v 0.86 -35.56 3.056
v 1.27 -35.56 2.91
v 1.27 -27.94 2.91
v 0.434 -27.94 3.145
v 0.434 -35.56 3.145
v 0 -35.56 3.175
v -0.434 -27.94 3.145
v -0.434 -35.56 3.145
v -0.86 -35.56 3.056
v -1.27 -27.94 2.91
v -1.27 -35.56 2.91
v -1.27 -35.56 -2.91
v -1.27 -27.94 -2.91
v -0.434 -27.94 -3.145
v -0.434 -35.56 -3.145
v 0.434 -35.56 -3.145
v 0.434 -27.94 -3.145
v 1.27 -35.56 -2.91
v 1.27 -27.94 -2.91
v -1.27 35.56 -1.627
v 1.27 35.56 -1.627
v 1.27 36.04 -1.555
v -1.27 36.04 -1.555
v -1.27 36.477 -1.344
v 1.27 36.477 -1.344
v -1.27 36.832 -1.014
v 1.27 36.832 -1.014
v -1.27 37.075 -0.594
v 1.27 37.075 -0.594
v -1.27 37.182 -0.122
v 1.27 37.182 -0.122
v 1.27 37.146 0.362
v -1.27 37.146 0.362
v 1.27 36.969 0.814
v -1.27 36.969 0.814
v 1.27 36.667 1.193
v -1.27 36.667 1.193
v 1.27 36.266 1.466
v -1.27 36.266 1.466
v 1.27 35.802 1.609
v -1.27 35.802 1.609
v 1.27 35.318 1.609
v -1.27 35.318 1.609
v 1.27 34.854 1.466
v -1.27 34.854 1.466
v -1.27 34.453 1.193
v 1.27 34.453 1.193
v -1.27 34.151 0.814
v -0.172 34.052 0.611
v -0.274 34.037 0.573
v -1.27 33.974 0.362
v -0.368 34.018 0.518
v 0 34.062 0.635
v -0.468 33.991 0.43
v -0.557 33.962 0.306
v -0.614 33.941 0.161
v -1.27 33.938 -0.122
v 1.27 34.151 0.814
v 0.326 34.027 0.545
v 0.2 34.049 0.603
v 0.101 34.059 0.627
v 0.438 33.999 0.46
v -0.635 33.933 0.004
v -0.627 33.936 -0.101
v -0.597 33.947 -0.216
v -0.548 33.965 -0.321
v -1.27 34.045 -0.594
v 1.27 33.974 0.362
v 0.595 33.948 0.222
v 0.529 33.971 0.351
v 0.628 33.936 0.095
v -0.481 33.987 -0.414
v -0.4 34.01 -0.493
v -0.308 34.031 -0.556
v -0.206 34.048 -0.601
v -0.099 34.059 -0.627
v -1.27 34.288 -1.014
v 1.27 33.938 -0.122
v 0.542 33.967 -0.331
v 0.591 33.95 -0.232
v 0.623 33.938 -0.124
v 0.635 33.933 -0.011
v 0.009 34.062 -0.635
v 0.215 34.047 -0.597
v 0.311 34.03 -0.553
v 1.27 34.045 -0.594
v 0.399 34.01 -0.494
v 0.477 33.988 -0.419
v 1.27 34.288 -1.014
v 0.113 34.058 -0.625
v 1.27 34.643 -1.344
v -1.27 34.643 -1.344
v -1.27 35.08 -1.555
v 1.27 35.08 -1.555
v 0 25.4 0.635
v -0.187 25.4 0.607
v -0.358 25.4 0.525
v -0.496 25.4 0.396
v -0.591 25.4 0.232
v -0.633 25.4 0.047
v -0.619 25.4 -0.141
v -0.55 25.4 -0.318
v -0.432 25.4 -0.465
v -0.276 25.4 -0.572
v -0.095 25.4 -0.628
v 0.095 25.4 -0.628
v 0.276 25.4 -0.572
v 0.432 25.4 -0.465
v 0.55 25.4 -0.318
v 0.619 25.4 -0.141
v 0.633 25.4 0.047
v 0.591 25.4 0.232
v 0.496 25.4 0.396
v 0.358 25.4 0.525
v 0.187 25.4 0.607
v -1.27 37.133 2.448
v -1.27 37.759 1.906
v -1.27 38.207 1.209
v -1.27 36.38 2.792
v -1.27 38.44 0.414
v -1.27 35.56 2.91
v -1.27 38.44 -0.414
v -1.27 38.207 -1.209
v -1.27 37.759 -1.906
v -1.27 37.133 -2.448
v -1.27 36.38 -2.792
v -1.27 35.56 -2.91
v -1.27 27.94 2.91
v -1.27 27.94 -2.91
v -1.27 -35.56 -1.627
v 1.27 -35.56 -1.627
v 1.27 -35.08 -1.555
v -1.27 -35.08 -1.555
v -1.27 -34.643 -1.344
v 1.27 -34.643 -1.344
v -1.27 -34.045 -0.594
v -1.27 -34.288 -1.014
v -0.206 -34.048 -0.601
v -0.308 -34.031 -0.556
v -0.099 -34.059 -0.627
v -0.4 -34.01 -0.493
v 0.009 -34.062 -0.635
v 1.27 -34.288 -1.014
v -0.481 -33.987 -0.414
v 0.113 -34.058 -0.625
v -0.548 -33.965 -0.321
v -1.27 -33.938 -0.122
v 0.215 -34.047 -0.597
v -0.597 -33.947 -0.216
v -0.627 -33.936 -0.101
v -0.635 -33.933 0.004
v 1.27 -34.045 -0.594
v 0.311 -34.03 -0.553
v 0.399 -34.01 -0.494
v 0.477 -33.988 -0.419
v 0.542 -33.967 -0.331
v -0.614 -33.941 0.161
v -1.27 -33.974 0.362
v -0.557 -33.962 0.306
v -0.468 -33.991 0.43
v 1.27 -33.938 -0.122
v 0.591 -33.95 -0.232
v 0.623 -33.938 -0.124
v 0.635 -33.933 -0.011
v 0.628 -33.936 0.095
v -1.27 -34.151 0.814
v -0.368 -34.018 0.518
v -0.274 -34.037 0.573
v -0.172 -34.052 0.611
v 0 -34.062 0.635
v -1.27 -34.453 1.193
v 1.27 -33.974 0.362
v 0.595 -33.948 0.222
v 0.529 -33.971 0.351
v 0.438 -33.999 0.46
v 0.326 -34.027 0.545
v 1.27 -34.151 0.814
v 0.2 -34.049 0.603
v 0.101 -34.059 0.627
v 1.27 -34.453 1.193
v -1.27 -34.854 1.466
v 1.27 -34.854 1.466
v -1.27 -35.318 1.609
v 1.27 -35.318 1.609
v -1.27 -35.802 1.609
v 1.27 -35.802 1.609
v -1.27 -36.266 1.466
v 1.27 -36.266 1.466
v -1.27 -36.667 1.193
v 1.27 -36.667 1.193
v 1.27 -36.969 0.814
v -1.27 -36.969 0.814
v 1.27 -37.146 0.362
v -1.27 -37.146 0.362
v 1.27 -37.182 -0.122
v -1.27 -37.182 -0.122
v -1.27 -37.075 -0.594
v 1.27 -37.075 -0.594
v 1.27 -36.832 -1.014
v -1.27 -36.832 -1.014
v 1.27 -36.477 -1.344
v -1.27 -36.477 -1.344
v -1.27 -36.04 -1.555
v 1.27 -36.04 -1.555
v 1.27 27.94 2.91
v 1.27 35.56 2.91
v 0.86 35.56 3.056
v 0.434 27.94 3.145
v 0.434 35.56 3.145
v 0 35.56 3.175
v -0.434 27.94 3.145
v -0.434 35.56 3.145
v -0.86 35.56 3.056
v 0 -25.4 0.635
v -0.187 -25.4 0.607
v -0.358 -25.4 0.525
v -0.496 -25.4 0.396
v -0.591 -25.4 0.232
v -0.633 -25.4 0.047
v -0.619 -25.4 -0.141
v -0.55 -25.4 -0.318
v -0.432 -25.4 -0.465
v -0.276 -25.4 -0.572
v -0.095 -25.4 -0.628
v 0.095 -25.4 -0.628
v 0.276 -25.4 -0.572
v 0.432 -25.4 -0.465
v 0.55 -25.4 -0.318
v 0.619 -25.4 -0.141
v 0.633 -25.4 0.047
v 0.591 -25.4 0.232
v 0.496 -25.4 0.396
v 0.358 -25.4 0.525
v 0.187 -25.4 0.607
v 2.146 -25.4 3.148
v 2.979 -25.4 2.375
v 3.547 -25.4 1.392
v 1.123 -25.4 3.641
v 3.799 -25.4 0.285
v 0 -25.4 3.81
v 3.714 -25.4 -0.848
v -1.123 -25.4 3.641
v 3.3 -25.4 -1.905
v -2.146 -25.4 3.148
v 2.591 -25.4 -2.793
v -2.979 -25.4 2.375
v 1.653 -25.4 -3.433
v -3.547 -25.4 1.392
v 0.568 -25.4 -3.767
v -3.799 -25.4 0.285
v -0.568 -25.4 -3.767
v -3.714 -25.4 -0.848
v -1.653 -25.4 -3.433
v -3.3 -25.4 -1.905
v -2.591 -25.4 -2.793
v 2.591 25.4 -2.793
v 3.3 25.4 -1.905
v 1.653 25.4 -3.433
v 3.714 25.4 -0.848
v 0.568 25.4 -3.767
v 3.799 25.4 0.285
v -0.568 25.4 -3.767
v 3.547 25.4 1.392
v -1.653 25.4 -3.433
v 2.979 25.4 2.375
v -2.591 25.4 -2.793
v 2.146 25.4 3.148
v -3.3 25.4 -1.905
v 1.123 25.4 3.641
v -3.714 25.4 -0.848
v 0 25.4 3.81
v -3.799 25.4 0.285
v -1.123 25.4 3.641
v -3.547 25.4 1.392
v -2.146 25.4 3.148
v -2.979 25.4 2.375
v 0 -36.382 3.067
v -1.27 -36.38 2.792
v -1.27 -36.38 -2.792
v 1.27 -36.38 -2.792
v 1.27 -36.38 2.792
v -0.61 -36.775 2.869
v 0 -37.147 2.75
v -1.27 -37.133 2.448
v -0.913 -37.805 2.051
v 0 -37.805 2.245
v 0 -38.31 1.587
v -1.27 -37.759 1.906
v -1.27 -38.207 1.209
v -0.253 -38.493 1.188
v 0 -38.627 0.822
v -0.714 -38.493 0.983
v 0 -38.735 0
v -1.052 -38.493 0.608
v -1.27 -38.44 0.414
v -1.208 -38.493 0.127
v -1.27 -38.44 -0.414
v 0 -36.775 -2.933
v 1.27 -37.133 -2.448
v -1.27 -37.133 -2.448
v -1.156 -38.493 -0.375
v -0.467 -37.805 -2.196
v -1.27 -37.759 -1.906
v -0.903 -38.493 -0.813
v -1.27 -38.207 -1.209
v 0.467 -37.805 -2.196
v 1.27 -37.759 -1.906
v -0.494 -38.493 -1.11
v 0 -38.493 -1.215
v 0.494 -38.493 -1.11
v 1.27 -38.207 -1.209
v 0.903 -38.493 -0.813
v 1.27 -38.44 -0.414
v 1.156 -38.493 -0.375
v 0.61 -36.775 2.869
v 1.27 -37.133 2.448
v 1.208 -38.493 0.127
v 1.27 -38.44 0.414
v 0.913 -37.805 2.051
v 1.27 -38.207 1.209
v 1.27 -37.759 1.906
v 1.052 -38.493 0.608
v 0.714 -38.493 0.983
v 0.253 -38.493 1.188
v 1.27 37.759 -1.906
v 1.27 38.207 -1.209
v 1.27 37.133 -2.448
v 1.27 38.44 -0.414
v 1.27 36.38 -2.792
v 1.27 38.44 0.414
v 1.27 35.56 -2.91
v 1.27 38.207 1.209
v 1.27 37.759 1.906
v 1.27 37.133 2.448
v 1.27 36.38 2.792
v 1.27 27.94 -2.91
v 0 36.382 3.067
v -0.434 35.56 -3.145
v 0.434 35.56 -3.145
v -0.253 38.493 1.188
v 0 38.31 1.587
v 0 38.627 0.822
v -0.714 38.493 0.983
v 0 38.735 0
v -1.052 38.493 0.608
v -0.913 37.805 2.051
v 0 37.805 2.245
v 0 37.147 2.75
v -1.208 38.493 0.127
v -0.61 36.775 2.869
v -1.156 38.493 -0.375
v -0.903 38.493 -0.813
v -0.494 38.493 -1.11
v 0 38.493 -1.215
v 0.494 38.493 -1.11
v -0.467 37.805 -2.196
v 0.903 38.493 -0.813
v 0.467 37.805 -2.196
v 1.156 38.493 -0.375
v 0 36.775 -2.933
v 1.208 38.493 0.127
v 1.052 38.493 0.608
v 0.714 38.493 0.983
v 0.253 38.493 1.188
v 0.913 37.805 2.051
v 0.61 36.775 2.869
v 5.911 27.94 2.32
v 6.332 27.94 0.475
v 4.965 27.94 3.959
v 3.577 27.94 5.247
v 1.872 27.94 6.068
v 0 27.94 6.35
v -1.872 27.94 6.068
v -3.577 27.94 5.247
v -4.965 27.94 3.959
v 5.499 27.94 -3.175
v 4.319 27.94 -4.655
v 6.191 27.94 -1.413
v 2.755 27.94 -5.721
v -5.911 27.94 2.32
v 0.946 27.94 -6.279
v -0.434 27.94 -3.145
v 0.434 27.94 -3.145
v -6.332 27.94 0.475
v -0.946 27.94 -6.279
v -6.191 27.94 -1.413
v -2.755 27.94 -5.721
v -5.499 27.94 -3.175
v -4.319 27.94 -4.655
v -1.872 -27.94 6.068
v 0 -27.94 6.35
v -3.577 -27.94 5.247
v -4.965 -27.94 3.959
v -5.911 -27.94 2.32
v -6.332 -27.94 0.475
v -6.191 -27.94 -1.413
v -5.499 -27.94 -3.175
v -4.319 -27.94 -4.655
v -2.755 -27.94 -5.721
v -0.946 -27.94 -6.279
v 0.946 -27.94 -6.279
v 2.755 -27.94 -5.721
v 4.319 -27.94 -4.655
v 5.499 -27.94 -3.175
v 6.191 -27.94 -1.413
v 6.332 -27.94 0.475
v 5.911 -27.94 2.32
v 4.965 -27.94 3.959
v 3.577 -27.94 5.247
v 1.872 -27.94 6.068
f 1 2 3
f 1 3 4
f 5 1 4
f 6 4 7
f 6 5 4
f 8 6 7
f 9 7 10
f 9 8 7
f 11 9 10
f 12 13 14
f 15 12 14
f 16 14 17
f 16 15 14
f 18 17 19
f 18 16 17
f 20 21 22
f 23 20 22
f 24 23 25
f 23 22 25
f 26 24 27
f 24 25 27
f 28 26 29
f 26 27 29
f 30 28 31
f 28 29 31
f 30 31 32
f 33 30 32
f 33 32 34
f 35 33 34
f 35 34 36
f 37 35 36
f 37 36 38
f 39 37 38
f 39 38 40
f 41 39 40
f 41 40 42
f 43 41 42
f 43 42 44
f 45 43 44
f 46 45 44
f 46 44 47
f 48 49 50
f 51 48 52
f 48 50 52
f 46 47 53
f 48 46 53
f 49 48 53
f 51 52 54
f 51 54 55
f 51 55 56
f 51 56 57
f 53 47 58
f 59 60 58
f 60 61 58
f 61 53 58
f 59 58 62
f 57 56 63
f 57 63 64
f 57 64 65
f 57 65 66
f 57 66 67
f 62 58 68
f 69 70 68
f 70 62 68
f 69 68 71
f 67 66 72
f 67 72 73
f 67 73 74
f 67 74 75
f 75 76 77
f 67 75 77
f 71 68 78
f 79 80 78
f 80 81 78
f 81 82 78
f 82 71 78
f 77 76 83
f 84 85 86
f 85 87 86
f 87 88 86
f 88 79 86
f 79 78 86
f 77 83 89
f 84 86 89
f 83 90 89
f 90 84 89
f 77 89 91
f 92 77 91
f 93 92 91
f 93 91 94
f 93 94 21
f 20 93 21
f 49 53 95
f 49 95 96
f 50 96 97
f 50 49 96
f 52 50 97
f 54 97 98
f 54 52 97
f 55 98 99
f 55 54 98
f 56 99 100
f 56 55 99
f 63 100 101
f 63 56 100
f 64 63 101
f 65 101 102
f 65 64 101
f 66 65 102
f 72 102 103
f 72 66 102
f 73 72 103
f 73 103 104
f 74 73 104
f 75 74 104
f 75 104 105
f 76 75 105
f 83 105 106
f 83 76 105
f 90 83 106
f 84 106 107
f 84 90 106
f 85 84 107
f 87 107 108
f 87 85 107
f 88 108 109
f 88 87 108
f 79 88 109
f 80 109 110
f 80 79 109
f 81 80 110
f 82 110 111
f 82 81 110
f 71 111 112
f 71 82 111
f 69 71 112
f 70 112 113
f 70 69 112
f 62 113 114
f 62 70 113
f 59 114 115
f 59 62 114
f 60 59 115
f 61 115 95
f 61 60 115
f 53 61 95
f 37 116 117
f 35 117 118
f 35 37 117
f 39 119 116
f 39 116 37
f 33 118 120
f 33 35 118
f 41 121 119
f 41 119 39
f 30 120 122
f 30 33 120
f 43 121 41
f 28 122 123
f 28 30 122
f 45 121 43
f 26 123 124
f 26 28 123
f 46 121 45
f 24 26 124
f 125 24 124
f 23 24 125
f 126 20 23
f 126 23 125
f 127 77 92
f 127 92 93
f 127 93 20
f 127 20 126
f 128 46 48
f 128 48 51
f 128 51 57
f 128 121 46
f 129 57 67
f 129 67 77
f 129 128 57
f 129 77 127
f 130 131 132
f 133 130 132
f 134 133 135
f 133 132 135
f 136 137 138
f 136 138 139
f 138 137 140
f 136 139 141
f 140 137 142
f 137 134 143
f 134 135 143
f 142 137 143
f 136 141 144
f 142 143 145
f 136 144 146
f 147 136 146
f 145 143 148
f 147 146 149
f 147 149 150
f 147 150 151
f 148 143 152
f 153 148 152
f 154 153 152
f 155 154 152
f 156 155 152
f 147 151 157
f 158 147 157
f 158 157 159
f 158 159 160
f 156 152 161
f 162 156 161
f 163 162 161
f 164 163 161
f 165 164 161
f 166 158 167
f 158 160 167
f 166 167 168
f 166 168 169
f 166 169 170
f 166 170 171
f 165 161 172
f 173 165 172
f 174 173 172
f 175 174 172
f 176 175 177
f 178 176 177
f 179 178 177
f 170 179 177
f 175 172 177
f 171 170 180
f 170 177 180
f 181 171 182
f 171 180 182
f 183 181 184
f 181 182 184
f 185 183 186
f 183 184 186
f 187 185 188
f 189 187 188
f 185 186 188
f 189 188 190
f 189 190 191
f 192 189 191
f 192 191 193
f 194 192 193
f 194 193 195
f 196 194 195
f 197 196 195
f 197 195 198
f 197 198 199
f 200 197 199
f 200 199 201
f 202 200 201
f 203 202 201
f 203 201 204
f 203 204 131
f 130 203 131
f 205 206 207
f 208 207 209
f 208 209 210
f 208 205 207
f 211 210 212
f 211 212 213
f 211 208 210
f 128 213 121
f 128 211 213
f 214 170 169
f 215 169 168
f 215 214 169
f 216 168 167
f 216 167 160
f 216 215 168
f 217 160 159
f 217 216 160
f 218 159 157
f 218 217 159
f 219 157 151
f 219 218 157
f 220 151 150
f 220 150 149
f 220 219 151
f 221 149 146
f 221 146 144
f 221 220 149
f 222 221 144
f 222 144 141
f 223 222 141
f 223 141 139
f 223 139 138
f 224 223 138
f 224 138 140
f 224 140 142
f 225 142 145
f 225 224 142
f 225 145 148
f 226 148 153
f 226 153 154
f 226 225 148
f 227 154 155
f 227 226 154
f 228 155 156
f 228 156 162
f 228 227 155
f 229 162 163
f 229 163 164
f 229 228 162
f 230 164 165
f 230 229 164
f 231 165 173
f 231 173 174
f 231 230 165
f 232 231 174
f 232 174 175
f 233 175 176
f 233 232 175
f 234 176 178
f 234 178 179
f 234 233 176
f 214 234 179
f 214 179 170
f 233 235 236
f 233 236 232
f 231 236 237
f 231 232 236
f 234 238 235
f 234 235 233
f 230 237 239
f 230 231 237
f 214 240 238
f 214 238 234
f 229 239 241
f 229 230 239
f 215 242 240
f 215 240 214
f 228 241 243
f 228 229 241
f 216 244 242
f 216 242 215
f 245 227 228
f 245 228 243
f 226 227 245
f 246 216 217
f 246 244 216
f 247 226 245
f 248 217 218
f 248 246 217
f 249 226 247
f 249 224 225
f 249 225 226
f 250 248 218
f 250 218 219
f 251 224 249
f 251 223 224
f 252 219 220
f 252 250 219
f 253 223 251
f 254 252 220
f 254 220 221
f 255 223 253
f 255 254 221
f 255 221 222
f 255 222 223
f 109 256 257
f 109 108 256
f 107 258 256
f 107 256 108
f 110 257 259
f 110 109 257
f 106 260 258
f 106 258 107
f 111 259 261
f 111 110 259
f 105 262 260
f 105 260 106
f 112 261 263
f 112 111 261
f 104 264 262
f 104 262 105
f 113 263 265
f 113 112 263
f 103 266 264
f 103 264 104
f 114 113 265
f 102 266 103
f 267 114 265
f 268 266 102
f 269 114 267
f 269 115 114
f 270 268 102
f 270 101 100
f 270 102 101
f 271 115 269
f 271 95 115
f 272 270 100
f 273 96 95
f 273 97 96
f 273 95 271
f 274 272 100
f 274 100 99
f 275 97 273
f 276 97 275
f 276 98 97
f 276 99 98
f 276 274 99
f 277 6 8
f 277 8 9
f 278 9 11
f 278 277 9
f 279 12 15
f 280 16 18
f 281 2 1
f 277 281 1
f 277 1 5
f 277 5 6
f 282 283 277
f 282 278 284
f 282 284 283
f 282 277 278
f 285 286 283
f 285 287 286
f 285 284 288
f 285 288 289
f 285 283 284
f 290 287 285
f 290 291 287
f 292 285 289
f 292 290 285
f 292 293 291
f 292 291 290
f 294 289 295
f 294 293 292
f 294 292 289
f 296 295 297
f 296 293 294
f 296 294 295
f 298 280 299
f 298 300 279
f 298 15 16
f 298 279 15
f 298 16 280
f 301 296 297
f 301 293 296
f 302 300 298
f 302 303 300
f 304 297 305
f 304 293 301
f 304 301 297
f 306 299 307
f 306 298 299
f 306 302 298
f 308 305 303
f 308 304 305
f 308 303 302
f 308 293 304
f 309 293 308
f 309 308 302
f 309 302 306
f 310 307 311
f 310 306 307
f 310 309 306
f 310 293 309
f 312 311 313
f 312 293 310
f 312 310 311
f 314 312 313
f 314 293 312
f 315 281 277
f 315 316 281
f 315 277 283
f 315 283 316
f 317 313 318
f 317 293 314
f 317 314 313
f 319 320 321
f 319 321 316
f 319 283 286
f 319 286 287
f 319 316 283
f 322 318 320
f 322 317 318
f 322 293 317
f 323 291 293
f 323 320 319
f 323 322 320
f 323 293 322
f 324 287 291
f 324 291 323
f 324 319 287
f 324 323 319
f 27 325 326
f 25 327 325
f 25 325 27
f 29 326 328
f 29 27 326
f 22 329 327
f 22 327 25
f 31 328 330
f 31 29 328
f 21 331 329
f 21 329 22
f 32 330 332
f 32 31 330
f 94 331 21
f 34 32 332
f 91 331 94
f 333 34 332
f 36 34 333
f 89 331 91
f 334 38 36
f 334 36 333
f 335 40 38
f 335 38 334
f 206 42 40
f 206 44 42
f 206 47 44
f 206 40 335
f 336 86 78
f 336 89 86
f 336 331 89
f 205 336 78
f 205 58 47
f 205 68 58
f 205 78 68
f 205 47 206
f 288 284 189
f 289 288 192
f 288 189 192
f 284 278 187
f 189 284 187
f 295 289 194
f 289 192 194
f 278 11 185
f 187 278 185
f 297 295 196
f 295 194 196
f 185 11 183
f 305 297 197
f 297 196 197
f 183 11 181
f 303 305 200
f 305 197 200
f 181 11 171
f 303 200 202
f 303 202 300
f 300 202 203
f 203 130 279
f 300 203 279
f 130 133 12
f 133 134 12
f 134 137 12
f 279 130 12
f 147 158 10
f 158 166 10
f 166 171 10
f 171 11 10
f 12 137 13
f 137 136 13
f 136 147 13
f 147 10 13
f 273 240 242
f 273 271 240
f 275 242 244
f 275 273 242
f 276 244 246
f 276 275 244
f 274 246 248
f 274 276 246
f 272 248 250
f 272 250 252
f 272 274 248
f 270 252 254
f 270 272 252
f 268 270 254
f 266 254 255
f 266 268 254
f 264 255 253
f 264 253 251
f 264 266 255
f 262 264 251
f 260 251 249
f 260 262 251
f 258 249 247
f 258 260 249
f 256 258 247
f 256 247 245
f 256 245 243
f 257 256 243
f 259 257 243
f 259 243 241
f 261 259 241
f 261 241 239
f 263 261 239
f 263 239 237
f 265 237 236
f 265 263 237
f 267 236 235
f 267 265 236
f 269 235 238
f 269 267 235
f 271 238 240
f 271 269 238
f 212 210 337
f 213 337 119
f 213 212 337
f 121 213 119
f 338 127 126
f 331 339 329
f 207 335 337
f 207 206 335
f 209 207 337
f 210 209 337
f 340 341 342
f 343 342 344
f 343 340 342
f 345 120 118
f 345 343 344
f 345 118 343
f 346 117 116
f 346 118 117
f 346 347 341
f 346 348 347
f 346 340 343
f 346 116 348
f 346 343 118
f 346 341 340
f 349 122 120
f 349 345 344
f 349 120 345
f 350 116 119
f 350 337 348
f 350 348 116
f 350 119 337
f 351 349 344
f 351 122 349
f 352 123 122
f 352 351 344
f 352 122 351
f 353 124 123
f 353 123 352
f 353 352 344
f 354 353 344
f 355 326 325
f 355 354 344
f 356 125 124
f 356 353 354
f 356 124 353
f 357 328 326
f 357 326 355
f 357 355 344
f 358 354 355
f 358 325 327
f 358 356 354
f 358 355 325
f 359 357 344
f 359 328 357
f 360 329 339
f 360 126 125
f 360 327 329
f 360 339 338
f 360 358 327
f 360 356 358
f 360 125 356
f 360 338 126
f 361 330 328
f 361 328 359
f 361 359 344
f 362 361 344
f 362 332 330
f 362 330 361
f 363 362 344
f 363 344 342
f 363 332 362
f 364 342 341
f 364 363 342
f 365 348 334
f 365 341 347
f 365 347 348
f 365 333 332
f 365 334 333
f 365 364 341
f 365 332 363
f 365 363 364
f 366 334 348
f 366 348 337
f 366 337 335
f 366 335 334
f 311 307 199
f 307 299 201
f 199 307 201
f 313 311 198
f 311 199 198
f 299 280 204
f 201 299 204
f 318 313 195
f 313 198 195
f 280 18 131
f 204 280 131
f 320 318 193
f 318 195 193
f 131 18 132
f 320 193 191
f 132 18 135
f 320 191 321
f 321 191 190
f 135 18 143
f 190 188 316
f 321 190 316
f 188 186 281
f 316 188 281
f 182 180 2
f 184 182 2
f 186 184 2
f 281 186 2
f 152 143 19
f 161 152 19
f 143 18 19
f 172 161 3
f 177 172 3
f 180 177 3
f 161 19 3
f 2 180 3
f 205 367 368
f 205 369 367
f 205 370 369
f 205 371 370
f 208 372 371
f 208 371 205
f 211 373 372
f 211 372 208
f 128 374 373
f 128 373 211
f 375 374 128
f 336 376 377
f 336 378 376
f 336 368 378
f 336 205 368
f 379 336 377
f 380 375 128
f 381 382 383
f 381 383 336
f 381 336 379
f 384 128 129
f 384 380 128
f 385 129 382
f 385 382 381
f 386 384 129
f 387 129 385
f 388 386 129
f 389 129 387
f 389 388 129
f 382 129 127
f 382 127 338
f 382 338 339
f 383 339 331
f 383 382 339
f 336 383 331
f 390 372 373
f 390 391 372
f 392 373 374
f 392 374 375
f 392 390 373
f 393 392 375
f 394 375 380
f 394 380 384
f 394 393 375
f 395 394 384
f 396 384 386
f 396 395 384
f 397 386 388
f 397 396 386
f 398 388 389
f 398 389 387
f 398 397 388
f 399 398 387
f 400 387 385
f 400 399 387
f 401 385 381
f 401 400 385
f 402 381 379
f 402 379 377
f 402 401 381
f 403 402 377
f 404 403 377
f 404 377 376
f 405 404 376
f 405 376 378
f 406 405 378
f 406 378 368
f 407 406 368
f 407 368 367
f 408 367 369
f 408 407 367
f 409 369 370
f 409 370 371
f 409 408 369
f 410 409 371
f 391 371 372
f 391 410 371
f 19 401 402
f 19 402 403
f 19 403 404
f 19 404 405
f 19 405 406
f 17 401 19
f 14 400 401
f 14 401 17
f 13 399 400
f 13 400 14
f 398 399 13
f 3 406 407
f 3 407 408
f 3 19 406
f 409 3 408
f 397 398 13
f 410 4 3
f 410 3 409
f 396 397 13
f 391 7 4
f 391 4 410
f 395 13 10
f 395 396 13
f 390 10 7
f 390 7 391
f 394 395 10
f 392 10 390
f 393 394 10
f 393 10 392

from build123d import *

# Parameters (mm, degrees)
CUT_EXTRUDE2_DEPTH = 68.277043819
SKETCH4_R          = 1.627
CUT_EXTRUDE3_DEPTH = 40.984836188


with BuildPart() as part:
    # Sketch1 → Revolve-Thin1 (revolve)
    with BuildSketch(Plane(origin=(0, 0, 0), x_dir=(0, 0, -1), z_dir=(1, 0, 0))):
        with BuildLine():
            ThreePointArc((0, 38.735), (-2.24506403, 37.80506403), (-3.175, 35.56))
            Line((-3.175, 35.56), (-3.175, 27.94))
            Line((-3.175, 27.94), (-6.35, 27.94))
            Line((-6.35, 27.94), (-6.35, -27.94))
            Line((-6.35, -27.94), (-3.175, -27.94))
            Line((-3.175, -27.94), (-3.175, -35.56))
            ThreePointArc((-3.175, -35.56), (-2.24506403, -37.80506403), (0, -38.735))
            Line((0, -38.735), (0, -36.195))
            ThreePointArc((0, -36.195), (-0.449012806, -36.009012806), (-0.635, -35.56))
            Line((-0.635, -35.56), (-0.635, -25.4))
            Line((-0.635, -25.4), (-3.81, -25.4))
            Line((-3.81, -25.4), (-3.81, 25.4))
            Line((-3.81, 25.4), (-0.635, 25.4))
            Line((-0.635, 25.4), (-0.635, 35.56))
            ThreePointArc((-0.635, 35.56), (-0.449012806, 36.009012806), (0, 36.195))
            Line((0, 36.195), (0, 38.735))
        make_face()
    revolve(axis=Axis((0, 35.56, 0), (0, -1, 0)))

    # Sketch3 → Cut-Extrude2 (cut, through all)
    with BuildSketch(Plane(origin=(0, 27.94, 0), x_dir=(1, 0, 0), z_dir=(0, 1, 0))):
        with BuildLine():
            ThreePointArc((-1.27, 2.909935566), (-3.175, 0), (-1.27, -2.909935566))
            Line((-1.27, -2.909935566), (-1.27, 2.909935566))
        make_face()
        with BuildLine():
            Line((1.27, 2.909935566), (1.27, -2.909935566))
            ThreePointArc((1.27, -2.909935566), (2.656395584, -1.73901912), (3.175, 0))
            ThreePointArc((3.175, 0), (2.656395584, 1.73901912), (1.27, 2.909935566))
        make_face()
    cut_extrude2 = extrude(amount=CUT_EXTRUDE2_DEPTH, mode=Mode.SUBTRACT)

    # Mirror1: Cut-Extrude2 across plane
    add(cut_extrude2.mirror(Plane.ZX), mode=Mode.SUBTRACT)

    # Sketch4 → Cut-Extrude3 (cut, through all)
    with BuildSketch(Plane(origin=(1.27, 0, 0), x_dir=(0, 0, -1), z_dir=(1, 0, 0))):
        with Locations((0, 35.56)):
            Circle(SKETCH4_R)
        with Locations((0, -35.56)):
            Circle(SKETCH4_R)
    extrude(amount=-CUT_EXTRUDE3_DEPTH, mode=Mode.SUBTRACT)


solid = part.part
